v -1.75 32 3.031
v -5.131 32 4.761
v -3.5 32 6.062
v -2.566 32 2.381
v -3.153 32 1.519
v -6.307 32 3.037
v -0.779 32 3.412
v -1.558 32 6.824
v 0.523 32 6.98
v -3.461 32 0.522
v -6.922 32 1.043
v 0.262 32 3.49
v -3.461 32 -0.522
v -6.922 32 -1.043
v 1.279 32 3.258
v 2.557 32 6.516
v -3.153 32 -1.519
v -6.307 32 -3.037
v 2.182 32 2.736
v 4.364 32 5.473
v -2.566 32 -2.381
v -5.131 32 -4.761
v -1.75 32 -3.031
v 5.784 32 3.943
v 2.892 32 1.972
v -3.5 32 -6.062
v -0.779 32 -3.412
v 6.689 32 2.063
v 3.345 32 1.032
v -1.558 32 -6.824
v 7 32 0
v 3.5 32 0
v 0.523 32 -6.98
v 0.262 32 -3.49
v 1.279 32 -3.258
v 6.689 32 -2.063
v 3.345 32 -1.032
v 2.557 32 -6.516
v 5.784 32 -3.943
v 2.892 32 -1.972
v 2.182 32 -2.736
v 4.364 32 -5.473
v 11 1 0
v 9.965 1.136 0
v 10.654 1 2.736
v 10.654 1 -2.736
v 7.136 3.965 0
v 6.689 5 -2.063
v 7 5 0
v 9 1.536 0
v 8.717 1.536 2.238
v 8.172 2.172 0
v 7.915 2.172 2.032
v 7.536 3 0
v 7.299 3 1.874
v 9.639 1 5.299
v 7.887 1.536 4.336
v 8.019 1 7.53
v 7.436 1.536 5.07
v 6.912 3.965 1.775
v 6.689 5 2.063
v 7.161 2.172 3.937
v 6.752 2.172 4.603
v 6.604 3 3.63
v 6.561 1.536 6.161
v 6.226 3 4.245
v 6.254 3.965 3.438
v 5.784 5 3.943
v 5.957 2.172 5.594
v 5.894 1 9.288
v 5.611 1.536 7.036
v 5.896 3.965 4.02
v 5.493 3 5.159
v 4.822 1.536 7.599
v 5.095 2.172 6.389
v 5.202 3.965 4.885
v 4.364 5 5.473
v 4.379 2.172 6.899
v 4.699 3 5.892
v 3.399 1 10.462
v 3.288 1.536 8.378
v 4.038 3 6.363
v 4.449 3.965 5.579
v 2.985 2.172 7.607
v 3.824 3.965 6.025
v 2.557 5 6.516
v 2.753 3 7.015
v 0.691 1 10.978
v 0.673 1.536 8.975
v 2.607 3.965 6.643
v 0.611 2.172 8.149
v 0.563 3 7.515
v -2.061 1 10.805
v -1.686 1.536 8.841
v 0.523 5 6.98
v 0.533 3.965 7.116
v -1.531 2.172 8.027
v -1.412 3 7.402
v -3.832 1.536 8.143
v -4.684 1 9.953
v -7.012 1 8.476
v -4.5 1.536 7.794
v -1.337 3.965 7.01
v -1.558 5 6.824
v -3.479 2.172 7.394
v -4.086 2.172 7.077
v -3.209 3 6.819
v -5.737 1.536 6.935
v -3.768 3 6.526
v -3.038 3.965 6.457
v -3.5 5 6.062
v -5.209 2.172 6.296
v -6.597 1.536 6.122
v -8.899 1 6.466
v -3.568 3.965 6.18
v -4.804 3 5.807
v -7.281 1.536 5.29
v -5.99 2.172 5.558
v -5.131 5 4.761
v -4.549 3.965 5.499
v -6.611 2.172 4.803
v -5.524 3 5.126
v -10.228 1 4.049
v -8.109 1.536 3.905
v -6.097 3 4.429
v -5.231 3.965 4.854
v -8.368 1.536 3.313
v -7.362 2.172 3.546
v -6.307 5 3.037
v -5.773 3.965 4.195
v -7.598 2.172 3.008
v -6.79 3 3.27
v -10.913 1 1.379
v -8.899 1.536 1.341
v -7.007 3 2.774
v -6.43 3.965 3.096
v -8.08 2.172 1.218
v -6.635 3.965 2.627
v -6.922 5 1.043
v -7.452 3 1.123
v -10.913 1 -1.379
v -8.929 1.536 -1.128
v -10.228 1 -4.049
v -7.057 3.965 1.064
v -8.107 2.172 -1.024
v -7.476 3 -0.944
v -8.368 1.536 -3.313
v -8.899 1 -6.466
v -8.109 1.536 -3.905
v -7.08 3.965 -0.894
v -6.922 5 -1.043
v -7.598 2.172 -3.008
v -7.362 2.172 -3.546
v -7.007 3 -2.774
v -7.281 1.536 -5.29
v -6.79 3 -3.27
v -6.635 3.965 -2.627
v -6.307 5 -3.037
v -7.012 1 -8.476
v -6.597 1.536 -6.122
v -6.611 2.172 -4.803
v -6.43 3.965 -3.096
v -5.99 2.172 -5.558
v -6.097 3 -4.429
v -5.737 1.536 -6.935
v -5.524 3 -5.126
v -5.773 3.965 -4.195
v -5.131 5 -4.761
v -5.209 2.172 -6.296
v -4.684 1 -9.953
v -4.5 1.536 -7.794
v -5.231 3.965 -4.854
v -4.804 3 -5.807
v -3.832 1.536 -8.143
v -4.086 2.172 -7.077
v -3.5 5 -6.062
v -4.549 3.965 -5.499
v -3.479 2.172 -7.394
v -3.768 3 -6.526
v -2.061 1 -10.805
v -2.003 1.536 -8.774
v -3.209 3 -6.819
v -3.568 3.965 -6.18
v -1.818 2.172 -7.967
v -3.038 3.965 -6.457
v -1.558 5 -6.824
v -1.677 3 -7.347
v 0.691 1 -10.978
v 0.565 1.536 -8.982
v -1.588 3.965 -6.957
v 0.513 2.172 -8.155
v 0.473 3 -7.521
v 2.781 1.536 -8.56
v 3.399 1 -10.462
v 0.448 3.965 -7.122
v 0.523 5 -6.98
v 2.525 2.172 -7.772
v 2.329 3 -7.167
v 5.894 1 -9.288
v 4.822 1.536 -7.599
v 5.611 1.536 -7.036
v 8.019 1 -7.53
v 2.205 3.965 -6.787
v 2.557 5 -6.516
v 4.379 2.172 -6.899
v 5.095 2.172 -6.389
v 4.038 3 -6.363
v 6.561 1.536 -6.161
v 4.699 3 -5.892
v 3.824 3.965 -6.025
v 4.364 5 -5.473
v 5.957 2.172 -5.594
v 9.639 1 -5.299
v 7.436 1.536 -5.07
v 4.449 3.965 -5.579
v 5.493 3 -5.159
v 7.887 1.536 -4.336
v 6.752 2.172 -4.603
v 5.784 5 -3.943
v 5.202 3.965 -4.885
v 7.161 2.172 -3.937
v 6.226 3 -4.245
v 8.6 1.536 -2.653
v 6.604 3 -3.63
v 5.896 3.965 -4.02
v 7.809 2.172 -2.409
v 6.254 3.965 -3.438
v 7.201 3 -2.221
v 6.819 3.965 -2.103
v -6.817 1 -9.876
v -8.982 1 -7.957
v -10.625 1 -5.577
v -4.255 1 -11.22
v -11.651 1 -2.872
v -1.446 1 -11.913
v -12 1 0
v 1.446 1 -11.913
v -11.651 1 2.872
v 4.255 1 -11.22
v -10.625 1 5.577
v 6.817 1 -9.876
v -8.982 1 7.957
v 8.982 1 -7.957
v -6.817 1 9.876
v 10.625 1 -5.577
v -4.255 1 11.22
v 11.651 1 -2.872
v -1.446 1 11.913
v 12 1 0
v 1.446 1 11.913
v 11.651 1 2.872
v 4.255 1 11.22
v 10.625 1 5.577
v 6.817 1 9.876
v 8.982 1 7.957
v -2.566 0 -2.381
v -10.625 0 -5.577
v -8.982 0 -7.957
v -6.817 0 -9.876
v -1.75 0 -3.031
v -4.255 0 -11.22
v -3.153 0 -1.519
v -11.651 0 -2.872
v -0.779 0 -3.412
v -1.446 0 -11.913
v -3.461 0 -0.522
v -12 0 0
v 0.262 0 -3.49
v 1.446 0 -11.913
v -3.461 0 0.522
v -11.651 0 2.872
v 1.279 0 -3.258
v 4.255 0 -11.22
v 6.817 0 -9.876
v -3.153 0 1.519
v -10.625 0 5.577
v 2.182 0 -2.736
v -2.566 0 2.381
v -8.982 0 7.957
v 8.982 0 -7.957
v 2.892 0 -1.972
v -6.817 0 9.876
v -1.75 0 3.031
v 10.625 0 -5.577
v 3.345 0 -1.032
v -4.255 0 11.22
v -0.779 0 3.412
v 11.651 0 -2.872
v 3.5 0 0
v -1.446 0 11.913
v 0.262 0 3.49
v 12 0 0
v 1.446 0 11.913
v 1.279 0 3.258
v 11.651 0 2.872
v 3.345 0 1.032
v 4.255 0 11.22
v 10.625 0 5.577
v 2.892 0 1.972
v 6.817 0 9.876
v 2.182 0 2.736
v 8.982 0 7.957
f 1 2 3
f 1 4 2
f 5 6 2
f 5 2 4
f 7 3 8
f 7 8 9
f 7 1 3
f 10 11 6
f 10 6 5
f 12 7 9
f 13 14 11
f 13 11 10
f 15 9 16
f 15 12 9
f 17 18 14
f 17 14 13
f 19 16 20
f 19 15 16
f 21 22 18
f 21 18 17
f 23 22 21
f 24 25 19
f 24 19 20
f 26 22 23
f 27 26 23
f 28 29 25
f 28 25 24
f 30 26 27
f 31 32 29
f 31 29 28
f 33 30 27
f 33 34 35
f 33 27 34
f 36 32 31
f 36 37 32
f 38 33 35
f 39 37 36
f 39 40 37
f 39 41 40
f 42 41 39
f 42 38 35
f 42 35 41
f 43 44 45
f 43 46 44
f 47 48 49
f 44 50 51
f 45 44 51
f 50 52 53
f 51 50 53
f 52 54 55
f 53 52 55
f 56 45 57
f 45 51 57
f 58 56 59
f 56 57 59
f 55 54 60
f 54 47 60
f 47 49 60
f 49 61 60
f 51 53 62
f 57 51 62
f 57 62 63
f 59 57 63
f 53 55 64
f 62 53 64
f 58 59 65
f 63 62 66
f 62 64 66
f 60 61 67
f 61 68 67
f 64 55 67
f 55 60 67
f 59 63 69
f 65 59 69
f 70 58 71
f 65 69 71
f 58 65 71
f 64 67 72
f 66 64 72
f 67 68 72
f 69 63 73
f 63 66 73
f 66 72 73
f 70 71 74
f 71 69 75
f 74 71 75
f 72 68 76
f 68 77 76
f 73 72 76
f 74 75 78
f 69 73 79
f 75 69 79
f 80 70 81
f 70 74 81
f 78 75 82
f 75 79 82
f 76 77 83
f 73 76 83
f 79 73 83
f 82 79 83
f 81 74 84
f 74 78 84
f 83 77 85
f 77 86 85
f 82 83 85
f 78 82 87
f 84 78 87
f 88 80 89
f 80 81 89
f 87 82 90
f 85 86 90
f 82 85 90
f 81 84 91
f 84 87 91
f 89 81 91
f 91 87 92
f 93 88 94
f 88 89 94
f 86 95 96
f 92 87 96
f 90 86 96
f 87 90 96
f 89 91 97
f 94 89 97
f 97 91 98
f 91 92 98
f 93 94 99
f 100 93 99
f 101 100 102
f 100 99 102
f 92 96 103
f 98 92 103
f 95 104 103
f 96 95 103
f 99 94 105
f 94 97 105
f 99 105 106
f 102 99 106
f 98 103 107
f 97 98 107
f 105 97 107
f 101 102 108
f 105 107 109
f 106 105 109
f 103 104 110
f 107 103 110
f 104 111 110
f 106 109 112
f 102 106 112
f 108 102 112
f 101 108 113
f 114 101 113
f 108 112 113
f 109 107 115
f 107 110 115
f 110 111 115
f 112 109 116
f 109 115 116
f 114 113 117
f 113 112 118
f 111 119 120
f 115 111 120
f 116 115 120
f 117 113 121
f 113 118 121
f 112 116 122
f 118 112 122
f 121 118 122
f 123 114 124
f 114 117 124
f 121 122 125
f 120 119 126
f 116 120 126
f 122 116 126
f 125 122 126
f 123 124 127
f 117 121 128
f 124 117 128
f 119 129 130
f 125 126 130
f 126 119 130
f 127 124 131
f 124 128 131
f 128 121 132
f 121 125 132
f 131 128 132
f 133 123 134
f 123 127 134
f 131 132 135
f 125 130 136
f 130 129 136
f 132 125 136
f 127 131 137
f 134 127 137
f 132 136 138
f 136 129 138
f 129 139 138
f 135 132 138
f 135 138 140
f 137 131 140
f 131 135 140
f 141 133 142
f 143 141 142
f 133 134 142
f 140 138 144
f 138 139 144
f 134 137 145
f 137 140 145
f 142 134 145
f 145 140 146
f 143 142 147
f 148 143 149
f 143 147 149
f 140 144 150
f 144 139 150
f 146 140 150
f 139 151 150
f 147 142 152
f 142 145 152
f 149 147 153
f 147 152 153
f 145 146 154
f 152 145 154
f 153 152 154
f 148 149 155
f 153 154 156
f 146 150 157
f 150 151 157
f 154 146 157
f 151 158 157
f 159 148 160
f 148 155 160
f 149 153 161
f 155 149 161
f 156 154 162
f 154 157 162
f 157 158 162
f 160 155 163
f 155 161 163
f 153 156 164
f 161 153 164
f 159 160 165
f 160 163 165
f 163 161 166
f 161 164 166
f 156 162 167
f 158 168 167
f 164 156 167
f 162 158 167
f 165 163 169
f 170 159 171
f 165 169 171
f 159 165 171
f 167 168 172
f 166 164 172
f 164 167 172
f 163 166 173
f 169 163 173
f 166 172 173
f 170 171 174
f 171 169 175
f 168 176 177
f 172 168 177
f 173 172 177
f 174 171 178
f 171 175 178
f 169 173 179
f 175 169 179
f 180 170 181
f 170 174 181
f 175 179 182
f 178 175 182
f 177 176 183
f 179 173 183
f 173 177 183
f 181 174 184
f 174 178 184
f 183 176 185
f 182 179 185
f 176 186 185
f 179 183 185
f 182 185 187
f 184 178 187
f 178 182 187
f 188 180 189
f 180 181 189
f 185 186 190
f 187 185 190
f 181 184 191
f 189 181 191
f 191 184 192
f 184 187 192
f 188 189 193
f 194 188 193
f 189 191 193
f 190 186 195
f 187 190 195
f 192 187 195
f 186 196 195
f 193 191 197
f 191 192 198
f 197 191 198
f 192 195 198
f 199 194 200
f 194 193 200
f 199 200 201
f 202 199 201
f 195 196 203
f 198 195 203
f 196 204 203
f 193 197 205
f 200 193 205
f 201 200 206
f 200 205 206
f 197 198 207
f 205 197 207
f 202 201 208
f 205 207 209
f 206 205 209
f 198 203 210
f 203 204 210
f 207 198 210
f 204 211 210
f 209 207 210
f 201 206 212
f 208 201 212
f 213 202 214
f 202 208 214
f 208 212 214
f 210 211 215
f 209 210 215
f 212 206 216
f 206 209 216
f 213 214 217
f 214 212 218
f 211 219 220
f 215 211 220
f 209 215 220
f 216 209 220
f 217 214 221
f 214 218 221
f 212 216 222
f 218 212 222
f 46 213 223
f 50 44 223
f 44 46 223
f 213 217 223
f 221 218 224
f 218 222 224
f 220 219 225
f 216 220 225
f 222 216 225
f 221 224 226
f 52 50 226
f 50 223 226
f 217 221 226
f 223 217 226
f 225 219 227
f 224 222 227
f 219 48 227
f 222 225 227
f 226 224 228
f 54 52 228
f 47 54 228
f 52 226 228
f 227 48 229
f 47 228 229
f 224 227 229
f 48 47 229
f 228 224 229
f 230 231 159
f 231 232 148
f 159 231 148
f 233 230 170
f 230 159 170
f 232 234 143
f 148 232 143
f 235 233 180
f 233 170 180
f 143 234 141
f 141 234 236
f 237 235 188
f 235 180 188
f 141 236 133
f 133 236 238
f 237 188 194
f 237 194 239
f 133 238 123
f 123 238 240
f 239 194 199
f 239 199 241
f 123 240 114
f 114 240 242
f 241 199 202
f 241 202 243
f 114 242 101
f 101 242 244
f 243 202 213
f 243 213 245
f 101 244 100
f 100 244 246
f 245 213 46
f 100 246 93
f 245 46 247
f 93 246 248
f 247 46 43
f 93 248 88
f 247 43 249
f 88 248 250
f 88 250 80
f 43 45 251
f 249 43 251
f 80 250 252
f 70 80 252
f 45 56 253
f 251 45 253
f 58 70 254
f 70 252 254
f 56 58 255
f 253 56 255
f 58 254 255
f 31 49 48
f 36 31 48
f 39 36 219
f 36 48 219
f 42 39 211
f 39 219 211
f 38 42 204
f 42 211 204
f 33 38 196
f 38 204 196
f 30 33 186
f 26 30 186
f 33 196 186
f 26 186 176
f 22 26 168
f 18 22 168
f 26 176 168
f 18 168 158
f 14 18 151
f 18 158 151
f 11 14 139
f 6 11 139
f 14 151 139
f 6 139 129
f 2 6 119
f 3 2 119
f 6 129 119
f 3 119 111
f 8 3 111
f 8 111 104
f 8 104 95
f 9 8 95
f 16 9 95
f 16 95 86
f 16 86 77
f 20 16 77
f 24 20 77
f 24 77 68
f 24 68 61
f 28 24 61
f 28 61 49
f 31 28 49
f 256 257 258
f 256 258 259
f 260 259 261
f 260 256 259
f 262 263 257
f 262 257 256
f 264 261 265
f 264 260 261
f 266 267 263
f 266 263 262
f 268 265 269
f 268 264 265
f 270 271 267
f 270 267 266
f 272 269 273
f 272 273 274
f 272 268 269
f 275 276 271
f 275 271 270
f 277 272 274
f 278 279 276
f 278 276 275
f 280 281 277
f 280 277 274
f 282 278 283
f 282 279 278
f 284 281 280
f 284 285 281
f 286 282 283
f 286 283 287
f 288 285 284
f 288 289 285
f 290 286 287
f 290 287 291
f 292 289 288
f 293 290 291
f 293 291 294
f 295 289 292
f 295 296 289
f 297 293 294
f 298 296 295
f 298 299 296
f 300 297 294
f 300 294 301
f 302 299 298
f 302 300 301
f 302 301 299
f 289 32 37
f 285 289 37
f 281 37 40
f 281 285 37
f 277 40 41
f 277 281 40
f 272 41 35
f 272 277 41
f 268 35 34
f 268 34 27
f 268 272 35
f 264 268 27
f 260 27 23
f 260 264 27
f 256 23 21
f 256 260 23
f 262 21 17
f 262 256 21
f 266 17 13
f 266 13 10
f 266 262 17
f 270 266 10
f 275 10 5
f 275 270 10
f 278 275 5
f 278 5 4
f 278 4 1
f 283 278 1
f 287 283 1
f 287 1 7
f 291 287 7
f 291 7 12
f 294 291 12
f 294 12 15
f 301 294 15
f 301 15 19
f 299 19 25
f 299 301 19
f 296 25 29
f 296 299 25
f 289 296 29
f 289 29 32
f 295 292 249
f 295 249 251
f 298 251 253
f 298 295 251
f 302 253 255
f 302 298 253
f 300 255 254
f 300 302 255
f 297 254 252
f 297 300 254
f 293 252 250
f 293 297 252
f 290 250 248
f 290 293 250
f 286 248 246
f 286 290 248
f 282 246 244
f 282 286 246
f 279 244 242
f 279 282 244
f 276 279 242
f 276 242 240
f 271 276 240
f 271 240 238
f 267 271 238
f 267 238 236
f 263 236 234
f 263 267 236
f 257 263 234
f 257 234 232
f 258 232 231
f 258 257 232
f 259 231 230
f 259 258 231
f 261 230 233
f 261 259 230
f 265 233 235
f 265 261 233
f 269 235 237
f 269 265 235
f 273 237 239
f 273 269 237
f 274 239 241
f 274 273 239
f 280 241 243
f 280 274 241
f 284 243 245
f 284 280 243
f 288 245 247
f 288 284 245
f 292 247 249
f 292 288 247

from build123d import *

# Parameters (mm, degrees)
CROQUIS1_R              = 7
CROQUIS1_R_2            = 3.5
SALIENTE_EXTRUIR1_DEPTH = 32
CROQUIS2_R              = 12
CROQUIS2_R_2            = 7
SALIENTE_EXTRUIR2_DEPTH = 1
REDONDEO1_R             = 4


with BuildPart() as part:
    # Croquis1 → Saliente-Extruir1 (new body)
    with BuildSketch(Plane(origin=(0, 0, 0), x_dir=(1, 0, 0), z_dir=(0, 1, 0))):
        Circle(CROQUIS1_R)
        Circle(CROQUIS1_R_2, mode=Mode.SUBTRACT)
    extrude(amount=SALIENTE_EXTRUIR1_DEPTH)

    # Croquis2 → Saliente-Extruir2 (add)
    with BuildSketch(Plane.XZ):
        Circle(CROQUIS2_R)
        Circle(CROQUIS2_R_2, mode=Mode.SUBTRACT)
    extrude(amount=-SALIENTE_EXTRUIR2_DEPTH)

    # Redondeo1
    redondeo1_edges = [part.edges().sort_by_distance(p)[0] for p in [
        (-7, 1, 0),
    ]]
    fillet(redondeo1_edges, radius=REDONDEO1_R)


solid = part.part
